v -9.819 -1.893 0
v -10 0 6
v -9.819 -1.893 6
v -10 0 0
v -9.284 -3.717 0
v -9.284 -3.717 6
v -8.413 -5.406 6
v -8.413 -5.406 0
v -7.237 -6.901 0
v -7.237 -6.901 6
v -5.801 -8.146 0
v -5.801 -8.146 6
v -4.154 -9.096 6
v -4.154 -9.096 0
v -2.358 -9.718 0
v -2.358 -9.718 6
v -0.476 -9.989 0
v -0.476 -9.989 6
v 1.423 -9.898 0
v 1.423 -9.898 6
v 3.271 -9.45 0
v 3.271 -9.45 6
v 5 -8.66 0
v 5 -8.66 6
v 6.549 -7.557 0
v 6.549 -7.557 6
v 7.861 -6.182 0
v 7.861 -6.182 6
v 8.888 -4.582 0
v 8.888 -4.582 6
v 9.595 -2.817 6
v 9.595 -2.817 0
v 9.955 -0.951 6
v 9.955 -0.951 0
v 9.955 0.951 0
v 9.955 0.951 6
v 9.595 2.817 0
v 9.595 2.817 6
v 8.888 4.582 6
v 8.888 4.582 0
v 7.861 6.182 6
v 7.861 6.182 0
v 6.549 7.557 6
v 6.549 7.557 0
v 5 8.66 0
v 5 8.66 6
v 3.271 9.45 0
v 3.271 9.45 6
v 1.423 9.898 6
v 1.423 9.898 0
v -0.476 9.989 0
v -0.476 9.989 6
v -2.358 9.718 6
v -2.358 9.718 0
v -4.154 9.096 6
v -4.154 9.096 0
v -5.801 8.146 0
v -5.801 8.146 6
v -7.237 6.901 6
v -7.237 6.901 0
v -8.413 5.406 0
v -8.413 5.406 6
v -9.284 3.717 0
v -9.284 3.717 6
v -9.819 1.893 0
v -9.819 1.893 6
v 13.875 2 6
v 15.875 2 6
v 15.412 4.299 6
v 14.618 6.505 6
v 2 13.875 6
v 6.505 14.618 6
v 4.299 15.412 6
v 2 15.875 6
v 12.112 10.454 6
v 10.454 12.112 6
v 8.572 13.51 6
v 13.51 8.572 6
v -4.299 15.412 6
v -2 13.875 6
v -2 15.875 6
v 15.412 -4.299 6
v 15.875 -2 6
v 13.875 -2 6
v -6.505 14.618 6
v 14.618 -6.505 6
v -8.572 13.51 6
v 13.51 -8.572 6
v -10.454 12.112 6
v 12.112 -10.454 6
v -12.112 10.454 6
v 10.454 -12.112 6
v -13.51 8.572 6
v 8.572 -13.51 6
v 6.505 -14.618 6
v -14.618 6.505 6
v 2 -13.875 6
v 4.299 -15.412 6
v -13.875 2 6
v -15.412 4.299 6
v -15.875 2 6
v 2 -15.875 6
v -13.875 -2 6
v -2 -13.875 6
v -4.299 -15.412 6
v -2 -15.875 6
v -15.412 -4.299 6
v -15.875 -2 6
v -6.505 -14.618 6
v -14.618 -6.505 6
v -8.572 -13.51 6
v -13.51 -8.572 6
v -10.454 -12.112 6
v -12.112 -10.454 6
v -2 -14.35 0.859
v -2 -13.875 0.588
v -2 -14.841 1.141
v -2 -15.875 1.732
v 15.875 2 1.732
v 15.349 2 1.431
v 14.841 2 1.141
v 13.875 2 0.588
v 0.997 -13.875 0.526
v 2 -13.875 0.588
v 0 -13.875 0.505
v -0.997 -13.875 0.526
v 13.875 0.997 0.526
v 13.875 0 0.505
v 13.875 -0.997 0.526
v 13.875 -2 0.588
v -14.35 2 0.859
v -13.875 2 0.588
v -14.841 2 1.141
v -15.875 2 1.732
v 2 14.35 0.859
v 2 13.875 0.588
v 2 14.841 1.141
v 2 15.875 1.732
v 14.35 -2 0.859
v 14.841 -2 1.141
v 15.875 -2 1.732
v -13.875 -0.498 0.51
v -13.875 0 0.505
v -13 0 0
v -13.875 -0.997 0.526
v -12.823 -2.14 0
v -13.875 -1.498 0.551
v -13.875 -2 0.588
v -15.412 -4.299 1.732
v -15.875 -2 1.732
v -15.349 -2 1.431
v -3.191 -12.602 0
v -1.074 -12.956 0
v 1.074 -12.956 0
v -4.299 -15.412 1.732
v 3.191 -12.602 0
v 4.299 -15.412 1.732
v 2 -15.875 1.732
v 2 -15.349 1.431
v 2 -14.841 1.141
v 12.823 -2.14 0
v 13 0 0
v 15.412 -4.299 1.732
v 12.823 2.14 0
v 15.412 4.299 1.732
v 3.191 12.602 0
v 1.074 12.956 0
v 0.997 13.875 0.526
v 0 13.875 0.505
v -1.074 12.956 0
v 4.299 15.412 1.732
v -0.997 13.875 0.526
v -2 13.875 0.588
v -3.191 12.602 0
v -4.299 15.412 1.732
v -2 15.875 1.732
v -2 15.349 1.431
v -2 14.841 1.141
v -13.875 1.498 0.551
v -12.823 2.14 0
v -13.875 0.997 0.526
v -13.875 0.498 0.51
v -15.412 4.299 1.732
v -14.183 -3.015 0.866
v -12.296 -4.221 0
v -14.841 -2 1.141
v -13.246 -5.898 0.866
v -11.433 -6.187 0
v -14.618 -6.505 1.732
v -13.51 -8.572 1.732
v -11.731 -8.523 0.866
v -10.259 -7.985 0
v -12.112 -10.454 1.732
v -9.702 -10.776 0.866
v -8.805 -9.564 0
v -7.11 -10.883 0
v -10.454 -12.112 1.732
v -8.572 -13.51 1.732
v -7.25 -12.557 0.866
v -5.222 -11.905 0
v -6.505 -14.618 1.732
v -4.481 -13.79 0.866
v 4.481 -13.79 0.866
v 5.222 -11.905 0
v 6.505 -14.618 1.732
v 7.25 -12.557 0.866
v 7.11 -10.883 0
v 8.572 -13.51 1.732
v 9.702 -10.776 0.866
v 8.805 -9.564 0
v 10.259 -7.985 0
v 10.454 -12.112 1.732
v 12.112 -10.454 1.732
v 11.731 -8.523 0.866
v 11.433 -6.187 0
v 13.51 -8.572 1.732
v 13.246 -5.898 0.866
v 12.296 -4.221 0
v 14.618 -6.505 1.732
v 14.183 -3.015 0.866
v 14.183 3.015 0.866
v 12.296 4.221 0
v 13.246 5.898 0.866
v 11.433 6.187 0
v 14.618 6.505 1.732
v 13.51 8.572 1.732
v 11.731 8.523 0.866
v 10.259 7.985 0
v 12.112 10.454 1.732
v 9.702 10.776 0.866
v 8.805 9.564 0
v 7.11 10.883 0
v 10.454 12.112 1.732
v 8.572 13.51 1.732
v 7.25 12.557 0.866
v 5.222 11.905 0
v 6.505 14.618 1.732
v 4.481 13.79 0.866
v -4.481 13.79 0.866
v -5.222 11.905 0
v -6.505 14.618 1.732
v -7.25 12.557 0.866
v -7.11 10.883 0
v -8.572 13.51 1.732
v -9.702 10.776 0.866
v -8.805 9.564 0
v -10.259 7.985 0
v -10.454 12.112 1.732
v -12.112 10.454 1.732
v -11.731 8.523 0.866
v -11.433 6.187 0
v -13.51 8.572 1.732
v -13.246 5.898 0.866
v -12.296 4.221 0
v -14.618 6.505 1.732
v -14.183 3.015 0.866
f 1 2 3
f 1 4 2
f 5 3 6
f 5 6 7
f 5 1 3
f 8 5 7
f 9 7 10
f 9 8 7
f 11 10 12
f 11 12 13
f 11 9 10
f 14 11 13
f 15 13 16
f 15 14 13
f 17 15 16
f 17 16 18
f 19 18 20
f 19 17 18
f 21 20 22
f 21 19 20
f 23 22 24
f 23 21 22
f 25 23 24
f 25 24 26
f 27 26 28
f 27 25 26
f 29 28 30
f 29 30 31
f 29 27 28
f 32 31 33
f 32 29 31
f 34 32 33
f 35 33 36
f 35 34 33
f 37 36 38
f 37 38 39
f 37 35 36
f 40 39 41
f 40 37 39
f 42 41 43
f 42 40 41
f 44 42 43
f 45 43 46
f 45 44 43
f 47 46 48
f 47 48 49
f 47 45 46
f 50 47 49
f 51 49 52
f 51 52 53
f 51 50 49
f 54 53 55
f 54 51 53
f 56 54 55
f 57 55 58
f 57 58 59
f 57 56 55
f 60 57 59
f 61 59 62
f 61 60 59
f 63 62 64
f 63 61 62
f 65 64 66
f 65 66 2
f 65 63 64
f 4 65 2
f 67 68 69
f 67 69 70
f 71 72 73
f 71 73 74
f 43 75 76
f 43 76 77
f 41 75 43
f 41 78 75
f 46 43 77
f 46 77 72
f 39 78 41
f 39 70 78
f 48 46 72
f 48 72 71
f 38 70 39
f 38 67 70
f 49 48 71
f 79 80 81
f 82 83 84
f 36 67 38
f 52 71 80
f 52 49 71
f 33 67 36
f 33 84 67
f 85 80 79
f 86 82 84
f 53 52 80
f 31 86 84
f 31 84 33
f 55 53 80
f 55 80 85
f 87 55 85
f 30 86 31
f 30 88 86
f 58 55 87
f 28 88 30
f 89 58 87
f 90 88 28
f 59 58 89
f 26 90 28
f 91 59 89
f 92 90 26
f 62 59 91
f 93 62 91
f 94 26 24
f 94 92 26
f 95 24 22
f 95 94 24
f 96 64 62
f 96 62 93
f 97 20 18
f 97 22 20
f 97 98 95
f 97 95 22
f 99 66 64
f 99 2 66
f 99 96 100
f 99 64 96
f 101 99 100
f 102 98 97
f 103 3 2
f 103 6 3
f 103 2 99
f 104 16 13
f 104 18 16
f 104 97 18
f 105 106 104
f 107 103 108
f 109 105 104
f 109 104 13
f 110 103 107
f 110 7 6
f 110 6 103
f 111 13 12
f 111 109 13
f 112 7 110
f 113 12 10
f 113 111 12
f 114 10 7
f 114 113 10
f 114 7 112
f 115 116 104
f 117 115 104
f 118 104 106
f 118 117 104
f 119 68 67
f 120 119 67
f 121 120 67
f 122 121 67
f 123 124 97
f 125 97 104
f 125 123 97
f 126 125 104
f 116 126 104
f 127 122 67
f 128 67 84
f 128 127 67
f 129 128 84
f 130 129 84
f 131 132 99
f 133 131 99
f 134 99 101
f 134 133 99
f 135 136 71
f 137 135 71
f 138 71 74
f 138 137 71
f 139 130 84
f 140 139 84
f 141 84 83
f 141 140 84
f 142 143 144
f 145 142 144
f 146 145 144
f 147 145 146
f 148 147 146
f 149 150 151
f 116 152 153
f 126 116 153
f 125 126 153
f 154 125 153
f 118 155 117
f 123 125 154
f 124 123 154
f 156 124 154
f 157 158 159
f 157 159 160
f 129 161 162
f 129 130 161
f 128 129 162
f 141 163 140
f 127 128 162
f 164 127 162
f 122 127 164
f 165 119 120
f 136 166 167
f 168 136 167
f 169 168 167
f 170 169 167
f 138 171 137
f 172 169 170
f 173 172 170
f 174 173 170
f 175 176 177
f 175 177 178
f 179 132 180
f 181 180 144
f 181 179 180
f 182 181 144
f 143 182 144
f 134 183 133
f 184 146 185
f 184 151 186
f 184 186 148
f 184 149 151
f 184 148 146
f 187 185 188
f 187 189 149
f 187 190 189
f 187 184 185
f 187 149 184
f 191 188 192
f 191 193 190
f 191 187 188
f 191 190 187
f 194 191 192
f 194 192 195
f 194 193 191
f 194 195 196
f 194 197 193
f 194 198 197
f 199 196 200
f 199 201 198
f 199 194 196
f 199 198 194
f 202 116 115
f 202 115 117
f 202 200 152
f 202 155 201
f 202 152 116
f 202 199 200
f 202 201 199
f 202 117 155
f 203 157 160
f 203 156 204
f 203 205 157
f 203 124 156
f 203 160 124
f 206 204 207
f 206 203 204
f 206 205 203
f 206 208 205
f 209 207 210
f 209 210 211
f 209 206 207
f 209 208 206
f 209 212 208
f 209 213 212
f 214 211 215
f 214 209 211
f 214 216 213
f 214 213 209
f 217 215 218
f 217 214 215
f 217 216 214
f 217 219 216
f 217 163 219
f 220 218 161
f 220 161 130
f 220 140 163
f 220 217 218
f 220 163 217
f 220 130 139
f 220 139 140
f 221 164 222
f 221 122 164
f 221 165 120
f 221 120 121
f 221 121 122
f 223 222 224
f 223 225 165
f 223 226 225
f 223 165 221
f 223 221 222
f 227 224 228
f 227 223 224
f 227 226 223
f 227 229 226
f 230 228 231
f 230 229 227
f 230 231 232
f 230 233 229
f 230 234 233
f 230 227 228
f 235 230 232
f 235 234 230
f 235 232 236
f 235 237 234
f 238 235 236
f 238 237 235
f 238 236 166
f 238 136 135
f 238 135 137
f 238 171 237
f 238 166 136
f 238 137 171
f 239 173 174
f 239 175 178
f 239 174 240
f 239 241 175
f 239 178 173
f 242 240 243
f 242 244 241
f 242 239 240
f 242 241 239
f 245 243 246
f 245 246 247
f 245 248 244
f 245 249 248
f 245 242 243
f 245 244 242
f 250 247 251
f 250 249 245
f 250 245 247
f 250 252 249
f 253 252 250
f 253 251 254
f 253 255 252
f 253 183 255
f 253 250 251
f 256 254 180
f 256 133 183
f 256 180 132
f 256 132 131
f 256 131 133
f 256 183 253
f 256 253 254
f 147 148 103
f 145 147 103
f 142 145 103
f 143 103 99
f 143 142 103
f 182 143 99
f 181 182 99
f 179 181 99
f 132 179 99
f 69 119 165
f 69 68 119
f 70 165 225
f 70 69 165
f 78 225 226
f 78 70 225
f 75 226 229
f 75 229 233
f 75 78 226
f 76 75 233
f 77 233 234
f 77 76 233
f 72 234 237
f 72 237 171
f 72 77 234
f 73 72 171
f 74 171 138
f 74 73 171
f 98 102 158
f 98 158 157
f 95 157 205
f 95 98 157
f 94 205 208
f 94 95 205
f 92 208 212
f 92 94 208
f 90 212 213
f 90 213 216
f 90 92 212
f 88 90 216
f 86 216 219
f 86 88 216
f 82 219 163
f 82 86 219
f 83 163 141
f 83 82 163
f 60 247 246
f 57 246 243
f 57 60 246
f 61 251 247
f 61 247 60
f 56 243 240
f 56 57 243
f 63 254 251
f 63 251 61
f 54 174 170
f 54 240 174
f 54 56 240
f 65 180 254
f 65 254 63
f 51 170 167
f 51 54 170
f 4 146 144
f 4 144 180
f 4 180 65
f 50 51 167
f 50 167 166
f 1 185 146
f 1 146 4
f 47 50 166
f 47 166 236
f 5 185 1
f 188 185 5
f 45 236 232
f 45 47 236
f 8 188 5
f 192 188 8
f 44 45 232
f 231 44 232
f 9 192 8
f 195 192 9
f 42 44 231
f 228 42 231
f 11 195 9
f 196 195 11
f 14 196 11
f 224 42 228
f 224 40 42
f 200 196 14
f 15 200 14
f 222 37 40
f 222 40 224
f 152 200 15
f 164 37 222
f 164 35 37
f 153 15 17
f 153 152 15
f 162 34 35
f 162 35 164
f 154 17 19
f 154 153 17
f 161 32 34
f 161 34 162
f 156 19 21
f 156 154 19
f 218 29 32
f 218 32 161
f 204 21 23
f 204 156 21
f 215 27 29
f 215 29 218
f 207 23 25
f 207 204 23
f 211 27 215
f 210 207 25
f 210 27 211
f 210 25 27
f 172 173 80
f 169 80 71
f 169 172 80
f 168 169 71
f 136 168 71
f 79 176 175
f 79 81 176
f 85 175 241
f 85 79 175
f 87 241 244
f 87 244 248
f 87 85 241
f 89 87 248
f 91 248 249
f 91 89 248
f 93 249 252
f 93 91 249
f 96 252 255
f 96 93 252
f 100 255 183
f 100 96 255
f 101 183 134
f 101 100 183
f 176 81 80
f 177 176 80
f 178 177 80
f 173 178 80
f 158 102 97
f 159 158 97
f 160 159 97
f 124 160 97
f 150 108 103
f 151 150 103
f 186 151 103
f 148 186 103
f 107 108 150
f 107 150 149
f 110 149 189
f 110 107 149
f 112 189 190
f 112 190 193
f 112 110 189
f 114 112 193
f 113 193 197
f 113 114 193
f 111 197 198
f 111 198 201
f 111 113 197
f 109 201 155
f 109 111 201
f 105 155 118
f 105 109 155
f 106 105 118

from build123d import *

# Parameters (mm, degrees)
ESQUISSE2_OUTSIDE_W     = 43.13
ESQUISSE2_OUTSIDE_H     = 43.13
ENL_V_MAT_EXTRU_2_DEPTH = 24.409399821


with BuildPart() as part:
    # Esquisse1 → Base-Révolution (revolve)
    with BuildSketch(Plane(origin=(0, 0, 0), x_dir=(0, 0, -1), z_dir=(1, 0, 0)), mode=Mode.PRIVATE) as base_r_volution_sk:
        Polygon((0, 10), (0, 13), (-1.732050808, 16), (-6, 16), (-6, 10), align=None)
    revolve(base_r_volution_sk.sketch.rotate(Axis((0, 0, 0), (0, 0, 1)), 90), axis=Axis((0, 0, 0), (0, 0, 1)))

    # Esquisse2 outside → Enlèv. mat.-Extru.2 (cut, through all)
    with BuildSketch(Plane.XY):
        Rectangle(ESQUISSE2_OUTSIDE_W, ESQUISSE2_OUTSIDE_H)
        with BuildLine():
            Line((-2, 13.874507866), (2, 13.874507866))
            Line((2, 13.874507866), (2, 15.874507866))
            ThreePointArc((2, 15.874507866), (11.313708499, 11.313708499), (15.874507866, 2))
            Line((15.874507866, 2), (13.874507866, 2))
            Line((13.874507866, 2), (13.874507866, -2))
            Line((13.874507866, -2), (15.874507866, -2))
            ThreePointArc((15.874507866, -2), (11.313708499, -11.313708499), (2, -15.874507866))
            Line((2, -15.874507866), (2, -13.874507866))
            Line((2, -13.874507866), (-2, -13.874507866))
            Line((-2, -13.874507866), (-2, -15.874507866))
            ThreePointArc((-2, -15.874507866), (-11.313708499, -11.313708499), (-15.874507866, -2))
            Line((-15.874507866, -2), (-13.874507866, -2))
            Line((-13.874507866, -2), (-13.874507866, 2))
            Line((-13.874507866, 2), (-15.874507866, 2))
            ThreePointArc((-15.874507866, 2), (-11.313708499, 11.313708499), (-2, 15.874507866))
            Line((-2, 15.874507866), (-2, 13.874507866))
        make_face(mode=Mode.SUBTRACT)
    extrude(amount=ENL_V_MAT_EXTRU_2_DEPTH, mode=Mode.SUBTRACT)


solid = part.part
